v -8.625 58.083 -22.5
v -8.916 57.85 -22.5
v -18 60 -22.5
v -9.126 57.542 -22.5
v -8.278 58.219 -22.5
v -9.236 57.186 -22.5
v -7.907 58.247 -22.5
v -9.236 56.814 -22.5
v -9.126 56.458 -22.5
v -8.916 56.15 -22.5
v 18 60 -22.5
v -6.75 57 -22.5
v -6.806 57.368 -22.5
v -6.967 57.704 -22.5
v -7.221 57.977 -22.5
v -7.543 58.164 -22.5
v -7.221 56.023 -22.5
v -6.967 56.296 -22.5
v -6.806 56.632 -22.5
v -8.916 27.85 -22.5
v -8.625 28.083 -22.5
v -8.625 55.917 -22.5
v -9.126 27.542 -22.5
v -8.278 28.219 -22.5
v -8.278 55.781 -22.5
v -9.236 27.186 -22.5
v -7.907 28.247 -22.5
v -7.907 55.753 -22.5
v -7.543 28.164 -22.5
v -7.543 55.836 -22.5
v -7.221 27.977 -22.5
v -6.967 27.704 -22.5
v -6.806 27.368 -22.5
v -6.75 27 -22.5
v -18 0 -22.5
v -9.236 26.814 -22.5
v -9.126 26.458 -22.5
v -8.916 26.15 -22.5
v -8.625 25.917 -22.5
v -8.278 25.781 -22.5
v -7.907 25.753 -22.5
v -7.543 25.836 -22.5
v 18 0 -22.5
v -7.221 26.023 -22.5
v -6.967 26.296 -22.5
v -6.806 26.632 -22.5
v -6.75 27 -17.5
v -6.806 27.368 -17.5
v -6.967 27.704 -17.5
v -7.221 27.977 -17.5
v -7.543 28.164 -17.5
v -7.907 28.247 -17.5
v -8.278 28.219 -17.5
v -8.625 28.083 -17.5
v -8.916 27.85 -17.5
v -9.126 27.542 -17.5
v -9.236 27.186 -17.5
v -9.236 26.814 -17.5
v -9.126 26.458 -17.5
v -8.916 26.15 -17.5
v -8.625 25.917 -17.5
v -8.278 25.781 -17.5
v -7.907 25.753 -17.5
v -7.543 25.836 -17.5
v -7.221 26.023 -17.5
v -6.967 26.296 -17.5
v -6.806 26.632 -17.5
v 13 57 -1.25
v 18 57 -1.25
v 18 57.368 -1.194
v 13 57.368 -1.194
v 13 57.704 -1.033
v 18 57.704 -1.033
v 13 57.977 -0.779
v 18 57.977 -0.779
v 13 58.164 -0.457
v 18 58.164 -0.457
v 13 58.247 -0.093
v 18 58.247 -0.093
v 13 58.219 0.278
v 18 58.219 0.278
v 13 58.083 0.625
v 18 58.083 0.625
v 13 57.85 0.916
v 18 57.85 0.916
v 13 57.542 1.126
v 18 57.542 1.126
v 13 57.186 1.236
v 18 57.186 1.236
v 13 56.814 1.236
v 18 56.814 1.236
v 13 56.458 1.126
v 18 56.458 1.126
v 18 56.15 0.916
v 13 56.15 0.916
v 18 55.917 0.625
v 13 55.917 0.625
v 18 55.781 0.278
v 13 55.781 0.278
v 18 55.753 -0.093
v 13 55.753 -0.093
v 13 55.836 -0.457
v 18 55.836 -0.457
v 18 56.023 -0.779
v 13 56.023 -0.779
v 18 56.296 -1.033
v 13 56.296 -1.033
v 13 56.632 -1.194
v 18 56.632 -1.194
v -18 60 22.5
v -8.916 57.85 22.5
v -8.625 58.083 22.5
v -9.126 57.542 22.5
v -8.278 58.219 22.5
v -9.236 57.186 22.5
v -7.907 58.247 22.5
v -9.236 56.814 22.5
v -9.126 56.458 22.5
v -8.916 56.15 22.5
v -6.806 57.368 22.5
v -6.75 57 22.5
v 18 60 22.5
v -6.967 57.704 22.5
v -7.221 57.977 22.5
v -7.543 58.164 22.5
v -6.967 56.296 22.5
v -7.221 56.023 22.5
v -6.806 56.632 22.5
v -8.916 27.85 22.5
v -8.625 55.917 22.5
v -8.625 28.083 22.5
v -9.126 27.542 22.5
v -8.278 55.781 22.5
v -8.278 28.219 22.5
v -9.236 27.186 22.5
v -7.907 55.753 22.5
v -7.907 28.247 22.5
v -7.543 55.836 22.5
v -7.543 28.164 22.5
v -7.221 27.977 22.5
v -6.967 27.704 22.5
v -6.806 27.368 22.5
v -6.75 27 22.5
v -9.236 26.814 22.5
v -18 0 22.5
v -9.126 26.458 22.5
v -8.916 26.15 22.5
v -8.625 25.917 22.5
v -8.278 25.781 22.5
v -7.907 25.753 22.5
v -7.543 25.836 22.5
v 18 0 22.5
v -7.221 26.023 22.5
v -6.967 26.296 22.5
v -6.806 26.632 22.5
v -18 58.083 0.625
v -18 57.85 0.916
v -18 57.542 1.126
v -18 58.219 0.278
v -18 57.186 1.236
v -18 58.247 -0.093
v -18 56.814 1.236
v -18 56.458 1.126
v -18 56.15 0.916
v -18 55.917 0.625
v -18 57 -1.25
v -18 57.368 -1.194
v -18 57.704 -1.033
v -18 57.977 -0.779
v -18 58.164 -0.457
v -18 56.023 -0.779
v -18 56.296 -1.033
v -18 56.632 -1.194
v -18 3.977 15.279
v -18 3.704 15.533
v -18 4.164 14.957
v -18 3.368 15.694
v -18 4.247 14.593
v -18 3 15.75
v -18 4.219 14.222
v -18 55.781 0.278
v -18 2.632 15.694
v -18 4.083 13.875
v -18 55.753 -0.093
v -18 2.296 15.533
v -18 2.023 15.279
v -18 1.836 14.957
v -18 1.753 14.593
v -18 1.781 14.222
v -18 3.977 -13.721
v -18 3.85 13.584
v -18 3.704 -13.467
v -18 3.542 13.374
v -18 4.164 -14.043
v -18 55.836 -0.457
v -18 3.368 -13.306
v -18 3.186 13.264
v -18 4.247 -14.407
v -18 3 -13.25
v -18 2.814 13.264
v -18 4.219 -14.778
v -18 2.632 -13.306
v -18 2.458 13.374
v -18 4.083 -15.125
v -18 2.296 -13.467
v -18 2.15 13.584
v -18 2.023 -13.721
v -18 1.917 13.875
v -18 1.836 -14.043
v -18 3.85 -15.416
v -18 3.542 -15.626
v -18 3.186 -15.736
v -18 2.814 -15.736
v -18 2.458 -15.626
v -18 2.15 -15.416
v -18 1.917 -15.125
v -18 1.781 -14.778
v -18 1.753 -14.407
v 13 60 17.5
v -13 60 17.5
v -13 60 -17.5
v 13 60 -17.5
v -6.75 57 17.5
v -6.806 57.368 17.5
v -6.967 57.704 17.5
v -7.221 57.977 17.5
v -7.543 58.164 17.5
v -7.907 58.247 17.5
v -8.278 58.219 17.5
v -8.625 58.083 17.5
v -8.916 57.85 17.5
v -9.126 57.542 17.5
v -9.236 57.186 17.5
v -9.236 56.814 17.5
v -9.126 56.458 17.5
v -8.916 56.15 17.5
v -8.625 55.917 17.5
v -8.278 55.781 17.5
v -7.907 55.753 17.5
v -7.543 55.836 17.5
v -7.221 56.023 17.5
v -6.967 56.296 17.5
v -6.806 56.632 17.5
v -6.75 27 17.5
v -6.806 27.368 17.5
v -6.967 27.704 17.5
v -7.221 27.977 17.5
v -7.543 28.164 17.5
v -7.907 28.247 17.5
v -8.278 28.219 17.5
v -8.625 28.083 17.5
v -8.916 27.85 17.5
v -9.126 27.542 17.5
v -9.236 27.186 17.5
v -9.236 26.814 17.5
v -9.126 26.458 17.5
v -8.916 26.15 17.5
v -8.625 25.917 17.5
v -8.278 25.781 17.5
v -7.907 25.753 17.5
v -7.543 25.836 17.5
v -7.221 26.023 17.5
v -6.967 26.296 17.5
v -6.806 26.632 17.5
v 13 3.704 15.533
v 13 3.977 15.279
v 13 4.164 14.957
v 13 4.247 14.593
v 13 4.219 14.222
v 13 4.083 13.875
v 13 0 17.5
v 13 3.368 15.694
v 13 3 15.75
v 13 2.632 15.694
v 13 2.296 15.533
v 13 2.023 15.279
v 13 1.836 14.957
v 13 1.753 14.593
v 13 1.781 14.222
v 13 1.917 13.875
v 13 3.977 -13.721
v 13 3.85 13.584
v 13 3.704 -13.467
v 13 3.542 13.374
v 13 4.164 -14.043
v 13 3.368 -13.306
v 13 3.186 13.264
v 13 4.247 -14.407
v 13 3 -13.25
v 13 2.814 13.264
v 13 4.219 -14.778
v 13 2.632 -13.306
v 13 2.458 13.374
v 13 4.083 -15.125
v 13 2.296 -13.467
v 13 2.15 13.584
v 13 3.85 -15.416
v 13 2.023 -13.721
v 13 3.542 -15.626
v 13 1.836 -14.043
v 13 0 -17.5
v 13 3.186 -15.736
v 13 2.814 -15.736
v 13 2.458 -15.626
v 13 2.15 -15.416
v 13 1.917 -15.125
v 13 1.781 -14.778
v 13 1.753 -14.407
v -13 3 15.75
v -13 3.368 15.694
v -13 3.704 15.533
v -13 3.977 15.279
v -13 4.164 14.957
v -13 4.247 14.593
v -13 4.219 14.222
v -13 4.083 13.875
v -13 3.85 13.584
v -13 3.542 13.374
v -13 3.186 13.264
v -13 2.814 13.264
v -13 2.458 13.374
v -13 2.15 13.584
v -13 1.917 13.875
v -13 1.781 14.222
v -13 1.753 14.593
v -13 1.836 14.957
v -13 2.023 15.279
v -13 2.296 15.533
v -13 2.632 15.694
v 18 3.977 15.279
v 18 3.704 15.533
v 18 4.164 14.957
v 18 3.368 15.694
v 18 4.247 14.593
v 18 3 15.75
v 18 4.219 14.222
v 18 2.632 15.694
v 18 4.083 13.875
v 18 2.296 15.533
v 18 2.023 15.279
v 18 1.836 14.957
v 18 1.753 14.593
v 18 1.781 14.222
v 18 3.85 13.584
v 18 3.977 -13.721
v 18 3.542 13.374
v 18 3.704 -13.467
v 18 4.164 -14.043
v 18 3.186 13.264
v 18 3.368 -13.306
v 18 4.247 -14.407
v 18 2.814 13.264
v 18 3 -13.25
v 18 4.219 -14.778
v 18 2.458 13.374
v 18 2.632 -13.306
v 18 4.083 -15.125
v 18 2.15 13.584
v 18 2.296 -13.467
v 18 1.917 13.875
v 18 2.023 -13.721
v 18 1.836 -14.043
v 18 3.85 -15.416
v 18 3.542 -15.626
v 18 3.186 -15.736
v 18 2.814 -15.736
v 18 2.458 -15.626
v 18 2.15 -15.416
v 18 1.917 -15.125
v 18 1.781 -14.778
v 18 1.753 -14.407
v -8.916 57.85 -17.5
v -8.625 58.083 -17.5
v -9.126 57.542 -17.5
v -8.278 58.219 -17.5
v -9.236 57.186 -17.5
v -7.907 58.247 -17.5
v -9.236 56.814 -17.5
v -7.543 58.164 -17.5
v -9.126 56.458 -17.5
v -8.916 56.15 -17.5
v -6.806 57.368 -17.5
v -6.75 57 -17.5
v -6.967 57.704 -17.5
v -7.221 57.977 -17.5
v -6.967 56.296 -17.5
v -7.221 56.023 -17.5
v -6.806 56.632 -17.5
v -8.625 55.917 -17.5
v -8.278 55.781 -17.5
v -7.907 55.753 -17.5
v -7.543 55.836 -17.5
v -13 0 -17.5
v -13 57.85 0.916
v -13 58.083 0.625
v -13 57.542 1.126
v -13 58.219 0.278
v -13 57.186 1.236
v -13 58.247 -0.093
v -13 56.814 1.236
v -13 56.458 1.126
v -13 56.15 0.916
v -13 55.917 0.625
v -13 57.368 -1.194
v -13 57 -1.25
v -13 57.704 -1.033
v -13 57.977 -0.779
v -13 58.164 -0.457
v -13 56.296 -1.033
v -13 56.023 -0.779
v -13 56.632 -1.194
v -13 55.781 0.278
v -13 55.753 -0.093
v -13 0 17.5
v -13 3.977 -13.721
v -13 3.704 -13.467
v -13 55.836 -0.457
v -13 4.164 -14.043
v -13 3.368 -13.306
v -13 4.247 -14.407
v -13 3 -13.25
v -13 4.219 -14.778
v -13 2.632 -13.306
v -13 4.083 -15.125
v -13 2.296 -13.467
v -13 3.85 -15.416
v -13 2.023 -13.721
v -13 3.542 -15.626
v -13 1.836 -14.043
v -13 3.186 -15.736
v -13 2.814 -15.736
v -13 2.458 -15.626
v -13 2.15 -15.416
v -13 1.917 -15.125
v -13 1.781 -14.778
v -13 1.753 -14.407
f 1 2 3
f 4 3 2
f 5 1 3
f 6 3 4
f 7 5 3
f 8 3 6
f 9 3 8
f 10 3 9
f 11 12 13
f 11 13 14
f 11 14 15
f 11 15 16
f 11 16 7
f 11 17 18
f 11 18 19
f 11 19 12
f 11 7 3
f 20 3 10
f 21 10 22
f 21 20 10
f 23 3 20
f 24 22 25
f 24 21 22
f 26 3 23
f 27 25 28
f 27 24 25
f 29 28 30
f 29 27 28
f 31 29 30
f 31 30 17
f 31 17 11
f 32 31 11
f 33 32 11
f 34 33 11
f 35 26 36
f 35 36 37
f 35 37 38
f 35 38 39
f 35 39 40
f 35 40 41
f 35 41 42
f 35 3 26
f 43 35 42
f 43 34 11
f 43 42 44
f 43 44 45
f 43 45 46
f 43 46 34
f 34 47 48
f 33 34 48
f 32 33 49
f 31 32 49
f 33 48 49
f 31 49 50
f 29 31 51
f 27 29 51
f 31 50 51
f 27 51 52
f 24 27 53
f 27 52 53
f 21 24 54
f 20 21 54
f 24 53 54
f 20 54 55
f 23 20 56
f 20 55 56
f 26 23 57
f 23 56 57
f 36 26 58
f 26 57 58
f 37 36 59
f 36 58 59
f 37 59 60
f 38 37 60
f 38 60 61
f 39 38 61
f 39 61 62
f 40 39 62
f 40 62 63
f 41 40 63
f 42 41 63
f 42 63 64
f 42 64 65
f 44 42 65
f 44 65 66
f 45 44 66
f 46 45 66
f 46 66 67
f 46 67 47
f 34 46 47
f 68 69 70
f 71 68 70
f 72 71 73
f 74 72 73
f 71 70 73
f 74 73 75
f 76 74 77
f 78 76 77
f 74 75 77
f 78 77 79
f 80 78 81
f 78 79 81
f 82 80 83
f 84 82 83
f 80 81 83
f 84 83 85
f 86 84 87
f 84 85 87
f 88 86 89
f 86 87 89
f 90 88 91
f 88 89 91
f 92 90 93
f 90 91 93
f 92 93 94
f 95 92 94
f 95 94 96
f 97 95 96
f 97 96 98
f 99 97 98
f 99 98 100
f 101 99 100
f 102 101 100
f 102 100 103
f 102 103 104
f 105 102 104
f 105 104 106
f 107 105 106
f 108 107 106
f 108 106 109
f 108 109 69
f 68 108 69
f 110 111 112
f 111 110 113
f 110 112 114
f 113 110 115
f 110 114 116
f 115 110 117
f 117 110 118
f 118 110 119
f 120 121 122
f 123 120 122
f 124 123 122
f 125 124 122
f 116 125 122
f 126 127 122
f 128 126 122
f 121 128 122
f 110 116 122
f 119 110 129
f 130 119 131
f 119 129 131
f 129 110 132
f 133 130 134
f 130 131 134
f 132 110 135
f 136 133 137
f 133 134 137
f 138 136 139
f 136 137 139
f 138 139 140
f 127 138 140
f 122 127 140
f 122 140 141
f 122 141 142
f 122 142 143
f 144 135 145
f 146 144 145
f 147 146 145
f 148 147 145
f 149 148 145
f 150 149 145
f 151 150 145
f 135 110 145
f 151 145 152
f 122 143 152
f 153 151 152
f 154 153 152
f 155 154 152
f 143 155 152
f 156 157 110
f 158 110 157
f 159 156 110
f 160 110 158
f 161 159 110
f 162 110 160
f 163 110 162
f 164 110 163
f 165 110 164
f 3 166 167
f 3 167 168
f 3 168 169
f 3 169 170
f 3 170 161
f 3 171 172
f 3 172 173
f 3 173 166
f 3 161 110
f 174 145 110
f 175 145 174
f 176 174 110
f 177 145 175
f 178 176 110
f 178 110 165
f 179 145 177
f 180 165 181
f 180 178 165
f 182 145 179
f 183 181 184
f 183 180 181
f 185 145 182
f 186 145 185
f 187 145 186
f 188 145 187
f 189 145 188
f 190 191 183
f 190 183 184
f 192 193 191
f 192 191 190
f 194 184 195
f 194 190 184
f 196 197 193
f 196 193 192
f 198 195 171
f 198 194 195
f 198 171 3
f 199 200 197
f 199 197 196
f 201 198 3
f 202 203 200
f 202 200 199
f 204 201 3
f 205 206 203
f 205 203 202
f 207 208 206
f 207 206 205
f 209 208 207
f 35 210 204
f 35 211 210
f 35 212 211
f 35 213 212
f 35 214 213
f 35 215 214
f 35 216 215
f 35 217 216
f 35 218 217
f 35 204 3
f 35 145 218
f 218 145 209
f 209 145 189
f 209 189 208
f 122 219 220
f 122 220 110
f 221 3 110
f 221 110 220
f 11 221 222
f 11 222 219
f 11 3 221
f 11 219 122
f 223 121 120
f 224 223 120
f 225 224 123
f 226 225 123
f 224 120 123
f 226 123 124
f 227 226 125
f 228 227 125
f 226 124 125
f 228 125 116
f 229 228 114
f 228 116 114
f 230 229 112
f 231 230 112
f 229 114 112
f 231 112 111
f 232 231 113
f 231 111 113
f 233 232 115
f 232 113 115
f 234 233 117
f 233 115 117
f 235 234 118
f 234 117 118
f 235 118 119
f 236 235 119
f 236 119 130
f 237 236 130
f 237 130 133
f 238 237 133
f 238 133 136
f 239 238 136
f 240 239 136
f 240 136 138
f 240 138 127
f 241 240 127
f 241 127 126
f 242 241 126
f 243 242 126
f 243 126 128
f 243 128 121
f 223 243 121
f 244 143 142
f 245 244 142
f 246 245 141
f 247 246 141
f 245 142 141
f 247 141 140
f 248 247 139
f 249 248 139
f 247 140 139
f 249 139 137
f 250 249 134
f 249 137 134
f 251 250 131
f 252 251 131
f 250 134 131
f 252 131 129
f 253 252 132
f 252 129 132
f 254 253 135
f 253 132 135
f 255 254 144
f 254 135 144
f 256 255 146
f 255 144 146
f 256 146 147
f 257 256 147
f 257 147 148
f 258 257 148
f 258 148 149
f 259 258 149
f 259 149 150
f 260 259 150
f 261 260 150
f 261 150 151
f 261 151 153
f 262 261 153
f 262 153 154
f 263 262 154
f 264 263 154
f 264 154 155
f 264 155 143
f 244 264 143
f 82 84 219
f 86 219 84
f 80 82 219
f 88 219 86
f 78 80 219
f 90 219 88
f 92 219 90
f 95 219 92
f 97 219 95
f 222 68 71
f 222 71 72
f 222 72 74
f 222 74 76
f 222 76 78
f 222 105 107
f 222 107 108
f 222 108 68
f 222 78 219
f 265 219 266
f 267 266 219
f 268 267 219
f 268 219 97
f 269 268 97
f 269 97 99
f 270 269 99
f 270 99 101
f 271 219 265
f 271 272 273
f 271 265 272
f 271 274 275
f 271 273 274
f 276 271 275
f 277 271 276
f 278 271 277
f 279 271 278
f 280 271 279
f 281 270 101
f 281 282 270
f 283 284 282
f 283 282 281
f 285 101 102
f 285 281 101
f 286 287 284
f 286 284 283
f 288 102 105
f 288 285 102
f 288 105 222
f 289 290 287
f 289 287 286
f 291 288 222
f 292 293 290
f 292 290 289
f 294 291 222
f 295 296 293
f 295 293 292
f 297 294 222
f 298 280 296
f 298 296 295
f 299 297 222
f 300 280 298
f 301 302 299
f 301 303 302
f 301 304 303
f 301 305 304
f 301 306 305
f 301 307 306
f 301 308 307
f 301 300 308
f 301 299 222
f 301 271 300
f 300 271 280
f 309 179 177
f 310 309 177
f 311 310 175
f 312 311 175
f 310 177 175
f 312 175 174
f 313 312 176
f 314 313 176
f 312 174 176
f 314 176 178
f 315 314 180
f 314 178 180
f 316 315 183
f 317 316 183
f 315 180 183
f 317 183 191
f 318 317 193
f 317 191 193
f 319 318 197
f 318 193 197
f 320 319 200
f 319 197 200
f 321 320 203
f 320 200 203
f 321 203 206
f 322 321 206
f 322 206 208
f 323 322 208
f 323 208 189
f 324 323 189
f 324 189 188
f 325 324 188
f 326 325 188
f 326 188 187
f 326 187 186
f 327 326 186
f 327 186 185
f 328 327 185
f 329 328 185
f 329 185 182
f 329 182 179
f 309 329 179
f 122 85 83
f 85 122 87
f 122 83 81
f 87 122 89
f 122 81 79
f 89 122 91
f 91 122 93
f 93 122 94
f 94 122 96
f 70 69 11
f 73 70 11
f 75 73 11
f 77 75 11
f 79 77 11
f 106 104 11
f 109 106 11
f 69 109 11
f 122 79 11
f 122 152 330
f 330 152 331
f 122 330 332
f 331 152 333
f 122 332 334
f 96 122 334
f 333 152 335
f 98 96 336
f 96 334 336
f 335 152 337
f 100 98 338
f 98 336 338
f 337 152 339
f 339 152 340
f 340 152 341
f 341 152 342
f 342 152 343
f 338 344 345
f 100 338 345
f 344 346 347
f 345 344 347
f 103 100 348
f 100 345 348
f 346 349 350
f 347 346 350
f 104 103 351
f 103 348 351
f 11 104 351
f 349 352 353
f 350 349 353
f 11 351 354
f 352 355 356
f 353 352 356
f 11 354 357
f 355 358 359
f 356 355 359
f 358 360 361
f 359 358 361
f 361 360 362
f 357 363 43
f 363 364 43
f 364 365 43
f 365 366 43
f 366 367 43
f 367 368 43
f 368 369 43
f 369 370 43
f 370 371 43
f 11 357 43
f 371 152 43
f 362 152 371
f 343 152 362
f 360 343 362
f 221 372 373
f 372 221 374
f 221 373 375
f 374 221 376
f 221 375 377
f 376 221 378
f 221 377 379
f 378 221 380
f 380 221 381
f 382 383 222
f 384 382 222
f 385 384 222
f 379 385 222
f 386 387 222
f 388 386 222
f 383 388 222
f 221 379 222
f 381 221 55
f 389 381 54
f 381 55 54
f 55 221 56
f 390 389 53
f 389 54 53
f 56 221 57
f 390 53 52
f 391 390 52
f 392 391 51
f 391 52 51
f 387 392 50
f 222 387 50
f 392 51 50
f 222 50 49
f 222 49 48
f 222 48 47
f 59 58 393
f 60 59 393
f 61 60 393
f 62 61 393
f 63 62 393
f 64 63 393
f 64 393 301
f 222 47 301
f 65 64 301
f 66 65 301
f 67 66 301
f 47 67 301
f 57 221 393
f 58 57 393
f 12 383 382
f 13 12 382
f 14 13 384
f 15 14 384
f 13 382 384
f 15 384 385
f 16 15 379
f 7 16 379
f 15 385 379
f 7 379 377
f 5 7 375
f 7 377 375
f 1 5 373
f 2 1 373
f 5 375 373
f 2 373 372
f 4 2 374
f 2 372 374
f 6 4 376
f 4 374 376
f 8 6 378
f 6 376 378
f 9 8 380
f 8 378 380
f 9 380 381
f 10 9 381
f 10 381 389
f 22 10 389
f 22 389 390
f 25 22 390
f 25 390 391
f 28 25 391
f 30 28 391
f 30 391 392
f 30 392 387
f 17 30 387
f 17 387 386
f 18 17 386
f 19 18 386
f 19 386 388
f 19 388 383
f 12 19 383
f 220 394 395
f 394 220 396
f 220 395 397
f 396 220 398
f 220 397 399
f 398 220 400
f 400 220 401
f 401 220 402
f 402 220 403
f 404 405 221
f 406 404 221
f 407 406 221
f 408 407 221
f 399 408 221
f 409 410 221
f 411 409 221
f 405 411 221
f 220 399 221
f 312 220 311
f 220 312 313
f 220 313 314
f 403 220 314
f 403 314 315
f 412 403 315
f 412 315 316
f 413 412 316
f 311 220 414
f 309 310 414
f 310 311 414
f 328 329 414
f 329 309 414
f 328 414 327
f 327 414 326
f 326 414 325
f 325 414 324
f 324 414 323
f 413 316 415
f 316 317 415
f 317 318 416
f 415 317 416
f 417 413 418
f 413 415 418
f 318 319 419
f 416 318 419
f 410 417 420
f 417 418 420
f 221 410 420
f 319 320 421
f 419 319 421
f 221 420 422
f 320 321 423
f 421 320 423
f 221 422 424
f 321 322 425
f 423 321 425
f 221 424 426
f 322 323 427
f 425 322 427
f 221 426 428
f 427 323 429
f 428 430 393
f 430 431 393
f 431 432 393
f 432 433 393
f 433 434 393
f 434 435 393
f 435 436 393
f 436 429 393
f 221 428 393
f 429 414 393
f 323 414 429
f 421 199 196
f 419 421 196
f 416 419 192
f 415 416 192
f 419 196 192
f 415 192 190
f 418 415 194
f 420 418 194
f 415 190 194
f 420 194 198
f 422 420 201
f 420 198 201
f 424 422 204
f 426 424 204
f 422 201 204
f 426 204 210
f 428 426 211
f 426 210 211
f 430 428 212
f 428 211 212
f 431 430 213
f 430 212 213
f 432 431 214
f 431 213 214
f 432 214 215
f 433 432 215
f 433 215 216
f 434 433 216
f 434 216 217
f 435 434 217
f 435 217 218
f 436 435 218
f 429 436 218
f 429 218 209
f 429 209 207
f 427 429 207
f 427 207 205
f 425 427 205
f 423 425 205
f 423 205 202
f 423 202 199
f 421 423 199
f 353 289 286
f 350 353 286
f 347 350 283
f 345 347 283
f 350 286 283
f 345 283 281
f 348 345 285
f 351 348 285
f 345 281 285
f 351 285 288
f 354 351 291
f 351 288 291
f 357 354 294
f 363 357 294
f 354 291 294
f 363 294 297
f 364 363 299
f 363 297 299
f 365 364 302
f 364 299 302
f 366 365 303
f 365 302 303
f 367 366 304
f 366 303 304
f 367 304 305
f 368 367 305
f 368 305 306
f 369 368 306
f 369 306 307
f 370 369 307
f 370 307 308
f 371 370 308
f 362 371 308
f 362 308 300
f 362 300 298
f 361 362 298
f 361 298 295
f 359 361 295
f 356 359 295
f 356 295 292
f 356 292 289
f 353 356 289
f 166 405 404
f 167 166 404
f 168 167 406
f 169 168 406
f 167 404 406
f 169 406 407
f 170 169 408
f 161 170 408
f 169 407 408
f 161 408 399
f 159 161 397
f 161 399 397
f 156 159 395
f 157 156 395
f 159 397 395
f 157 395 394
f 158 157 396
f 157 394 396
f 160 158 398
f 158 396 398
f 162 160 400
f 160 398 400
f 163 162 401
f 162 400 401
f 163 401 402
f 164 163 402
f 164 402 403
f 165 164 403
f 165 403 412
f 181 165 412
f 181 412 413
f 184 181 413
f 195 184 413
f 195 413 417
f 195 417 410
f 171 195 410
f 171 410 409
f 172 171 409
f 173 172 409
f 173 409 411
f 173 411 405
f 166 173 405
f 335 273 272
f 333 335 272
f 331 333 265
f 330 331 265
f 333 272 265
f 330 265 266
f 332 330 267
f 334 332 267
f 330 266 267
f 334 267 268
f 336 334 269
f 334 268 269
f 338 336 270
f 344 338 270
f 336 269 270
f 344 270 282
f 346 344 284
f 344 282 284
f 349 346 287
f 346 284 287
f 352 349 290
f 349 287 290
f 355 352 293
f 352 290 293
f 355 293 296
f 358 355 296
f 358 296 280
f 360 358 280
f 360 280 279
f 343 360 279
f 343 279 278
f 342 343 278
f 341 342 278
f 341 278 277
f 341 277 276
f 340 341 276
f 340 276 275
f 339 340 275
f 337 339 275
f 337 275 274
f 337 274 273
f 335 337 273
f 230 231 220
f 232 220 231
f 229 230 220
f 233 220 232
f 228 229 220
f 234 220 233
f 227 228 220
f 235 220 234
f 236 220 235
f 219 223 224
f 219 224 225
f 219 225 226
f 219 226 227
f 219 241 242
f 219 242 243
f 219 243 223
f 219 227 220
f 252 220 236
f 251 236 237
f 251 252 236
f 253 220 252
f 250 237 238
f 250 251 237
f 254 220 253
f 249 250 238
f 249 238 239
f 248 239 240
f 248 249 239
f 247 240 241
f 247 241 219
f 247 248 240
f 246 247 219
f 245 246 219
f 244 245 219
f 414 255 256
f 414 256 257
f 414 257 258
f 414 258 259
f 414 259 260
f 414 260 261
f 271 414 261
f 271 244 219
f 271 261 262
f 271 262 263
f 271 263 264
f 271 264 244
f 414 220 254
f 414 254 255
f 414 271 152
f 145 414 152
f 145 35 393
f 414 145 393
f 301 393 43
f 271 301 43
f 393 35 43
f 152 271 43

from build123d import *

# Parameters (mm, degrees)
SKETCH_1_W          = 36
SKETCH_1_H          = 45
SKETCH_1_W_2        = 26
SKETCH_1_H_2        = 35
EXTRUDE_1_DEPTH     = 60
SKETCH_4_R          = 1.25
CUT_EXTRUDE_1_DEPTH = 74.5
SKETCH_5_R          = 1.25
CUT_EXTRUDE_2_DEPTH = 78.129760793
SKETCH_6_R          = 1.25
CUT_EXTRUDE_3_DEPTH = 74.5


with BuildPart() as part:
    # 草图1 → 凸台-拉伸1 (new body)
    with BuildSketch(Plane(origin=(0, 0, 0), x_dir=(1, 0, 0), z_dir=(0, 1, 0))):
        Rectangle(SKETCH_1_W, SKETCH_1_H)
        Rectangle(SKETCH_1_W_2, SKETCH_1_H_2, mode=Mode.SUBTRACT)
    extrude(amount=EXTRUDE_1_DEPTH)

    # 草图4 → 切除-拉伸1 (cut, through all)
    with BuildSketch(Plane.ZY.offset(18)):
        with Locations((14.5, 3)):
            Circle(SKETCH_4_R)
        with Locations((-14.5, 3)):
            Circle(SKETCH_4_R)
    extrude(amount=-CUT_EXTRUDE_1_DEPTH, mode=Mode.SUBTRACT)

    # 草图5 → 切除-拉伸2 (cut, through all)
    with BuildSketch(Plane.XY.offset(22.5)):
        with Locations((-8, 57)):
            Circle(SKETCH_5_R)
        with Locations((-8, 27)):
            Circle(SKETCH_5_R)
    extrude(amount=-CUT_EXTRUDE_2_DEPTH, mode=Mode.SUBTRACT)

    # 草图6 → 切除-拉伸3 (cut, through all)
    with BuildSketch(Plane(origin=(18, 0, 0), x_dir=(0, 0, -1), z_dir=(1, 0, 0))):
        with Locations((0, 57)):
            Circle(SKETCH_6_R)
    extrude(amount=-CUT_EXTRUDE_3_DEPTH, mode=Mode.SUBTRACT)


solid = part.part
